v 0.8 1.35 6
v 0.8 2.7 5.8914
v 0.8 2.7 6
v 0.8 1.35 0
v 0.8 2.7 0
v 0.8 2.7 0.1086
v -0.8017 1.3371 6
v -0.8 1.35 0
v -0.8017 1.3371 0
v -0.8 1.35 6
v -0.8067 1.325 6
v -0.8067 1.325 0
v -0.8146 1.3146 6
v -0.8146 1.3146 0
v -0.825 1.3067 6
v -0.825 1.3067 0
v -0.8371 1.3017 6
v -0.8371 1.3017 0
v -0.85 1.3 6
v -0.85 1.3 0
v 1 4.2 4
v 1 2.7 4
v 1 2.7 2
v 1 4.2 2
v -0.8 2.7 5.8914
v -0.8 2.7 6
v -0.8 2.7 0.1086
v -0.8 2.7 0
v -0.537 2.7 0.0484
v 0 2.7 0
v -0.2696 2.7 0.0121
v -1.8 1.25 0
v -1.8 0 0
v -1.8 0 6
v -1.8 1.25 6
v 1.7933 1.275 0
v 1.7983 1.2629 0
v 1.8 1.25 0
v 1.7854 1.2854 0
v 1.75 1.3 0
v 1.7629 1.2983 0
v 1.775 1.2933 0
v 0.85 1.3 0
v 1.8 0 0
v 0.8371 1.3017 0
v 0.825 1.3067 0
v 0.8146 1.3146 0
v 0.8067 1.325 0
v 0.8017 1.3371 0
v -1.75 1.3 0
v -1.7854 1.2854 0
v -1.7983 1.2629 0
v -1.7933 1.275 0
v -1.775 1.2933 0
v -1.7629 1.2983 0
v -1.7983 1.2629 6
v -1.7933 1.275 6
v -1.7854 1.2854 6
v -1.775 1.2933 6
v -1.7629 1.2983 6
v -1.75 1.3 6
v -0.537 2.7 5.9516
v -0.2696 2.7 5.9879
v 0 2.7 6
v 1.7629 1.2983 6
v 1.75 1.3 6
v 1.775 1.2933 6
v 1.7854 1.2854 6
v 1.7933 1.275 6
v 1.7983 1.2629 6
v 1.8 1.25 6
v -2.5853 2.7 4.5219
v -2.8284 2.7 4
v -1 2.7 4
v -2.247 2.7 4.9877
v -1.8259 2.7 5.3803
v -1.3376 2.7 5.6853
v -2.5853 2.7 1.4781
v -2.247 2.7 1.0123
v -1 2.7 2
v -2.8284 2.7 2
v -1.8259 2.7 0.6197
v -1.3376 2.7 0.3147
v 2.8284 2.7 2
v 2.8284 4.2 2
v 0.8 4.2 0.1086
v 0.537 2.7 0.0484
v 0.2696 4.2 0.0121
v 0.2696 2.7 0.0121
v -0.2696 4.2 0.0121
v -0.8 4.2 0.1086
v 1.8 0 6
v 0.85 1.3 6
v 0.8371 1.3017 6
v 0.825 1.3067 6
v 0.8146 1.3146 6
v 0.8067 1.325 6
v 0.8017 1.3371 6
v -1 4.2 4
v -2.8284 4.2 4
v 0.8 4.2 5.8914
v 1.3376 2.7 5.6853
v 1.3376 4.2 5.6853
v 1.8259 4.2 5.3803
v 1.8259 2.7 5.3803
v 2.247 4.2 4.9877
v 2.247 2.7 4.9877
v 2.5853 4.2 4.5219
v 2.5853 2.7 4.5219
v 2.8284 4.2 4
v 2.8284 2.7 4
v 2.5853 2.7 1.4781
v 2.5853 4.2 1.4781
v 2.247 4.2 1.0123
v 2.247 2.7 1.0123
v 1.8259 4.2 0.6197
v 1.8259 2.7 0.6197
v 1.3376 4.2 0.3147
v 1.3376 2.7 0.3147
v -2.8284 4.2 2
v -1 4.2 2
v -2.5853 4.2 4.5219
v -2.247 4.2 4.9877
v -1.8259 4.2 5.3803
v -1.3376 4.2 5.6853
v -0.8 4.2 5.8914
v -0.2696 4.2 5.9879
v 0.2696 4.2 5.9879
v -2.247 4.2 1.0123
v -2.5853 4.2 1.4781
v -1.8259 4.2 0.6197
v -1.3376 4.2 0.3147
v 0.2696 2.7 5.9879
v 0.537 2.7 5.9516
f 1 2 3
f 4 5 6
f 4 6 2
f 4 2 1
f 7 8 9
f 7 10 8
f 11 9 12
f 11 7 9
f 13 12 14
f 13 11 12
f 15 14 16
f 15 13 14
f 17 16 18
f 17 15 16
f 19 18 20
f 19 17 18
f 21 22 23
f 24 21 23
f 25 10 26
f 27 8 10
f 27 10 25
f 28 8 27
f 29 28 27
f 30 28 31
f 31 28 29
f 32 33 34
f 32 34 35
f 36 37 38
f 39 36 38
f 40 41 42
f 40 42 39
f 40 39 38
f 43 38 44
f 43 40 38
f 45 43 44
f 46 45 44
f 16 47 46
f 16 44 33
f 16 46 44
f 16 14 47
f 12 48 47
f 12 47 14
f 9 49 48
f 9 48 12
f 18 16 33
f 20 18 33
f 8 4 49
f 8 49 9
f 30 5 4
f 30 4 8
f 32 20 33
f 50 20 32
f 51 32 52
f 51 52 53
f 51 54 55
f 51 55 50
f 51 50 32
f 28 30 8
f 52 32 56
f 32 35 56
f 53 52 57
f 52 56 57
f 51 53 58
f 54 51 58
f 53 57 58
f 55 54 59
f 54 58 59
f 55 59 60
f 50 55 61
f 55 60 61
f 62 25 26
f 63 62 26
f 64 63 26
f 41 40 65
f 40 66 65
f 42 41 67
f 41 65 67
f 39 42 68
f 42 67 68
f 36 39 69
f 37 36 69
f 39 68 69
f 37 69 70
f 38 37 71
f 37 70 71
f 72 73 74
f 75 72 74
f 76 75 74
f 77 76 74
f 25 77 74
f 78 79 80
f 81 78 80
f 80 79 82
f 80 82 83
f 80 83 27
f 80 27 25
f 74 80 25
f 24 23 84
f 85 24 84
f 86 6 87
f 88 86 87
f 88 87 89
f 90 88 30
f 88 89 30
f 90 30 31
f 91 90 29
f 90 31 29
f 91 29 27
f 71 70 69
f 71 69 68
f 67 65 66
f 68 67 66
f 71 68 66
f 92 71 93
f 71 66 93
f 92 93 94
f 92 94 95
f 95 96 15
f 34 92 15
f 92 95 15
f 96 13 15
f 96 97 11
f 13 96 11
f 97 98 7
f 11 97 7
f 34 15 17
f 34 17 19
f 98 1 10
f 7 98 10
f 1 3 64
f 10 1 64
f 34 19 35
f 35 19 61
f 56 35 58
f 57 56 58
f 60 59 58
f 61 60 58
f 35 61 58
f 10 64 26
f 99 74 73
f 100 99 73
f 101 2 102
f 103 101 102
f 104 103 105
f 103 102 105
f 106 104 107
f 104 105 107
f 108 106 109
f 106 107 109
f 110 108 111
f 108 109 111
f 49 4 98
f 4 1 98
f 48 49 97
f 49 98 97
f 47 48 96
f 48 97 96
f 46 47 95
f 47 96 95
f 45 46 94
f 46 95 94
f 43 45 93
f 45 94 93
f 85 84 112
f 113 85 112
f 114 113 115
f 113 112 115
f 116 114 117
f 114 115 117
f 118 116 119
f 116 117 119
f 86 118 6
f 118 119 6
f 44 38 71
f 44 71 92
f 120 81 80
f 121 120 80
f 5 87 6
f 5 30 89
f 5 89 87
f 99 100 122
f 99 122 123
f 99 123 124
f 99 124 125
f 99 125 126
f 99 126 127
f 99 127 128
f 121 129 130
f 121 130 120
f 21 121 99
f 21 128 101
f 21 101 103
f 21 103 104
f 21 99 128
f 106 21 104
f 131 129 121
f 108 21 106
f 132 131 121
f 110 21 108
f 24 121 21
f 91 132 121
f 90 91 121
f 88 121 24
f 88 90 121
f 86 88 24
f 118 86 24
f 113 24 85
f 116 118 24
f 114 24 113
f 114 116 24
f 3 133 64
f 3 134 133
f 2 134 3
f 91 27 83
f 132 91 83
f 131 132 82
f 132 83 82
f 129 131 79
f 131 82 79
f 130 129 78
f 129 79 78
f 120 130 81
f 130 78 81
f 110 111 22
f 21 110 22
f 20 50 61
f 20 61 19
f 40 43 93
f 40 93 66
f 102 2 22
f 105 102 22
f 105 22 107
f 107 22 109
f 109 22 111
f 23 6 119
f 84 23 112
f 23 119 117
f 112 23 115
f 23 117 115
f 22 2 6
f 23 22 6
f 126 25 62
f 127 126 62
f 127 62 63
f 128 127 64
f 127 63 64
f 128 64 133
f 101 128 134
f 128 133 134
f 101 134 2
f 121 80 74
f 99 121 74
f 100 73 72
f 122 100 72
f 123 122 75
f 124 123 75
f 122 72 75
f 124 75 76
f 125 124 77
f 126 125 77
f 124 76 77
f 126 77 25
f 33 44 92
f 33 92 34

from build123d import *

# Parameters (mm, degrees)
BOSS_EXTRUDE1_DEPTH = 6
BOSS_EXTRUDE2_DEPTH = 1.5
FILLET6_R           = 0.05


with BuildPart() as part:
    # Sketch2 → Boss-Extrude1 (new body)
    with BuildSketch(Plane.XY):
        Polygon((-0.8, 2.7), (0.8, 2.7), (0.8, 1.3), (1.8, 1.3), (1.8, 0), (-1.8, 0), (-1.8, 1.3), (-0.8, 1.3), align=None)
    extrude(amount=BOSS_EXTRUDE1_DEPTH)

    # Sketch3 → Boss-Extrude2 (add)
    with BuildSketch(Plane(origin=(0, 2.7, 0), x_dir=(1, 0, 0), z_dir=(0, 1, 0))):
        with BuildLine():
            ThreePointArc((0.8, -0.108633541), (0, 0), (-0.8, -0.108633541))
            Line((-0.8, -0.108633541), (-0.8, -5.891366459))
            ThreePointArc((-0.8, -5.891366459), (0, -6), (0.8, -5.891366459))
            Line((0.8, -5.891366459), (0.8, -0.108633541))
        make_face()
        with BuildLine():
            Line((-2.828427125, -2), (-1, -2))
            Line((-1, -2), (-1, -4))
            Line((-1, -4), (-2.828427125, -4))
            ThreePointArc((-2.828427125, -4), (-2.04589531, -5.194154138), (-0.8, -5.891366459))
            Line((-0.8, -5.891366459), (-0.8, -0.108633541))
            ThreePointArc((-0.8, -0.108633541), (-2.04589531, -0.805845862), (-2.828427125, -2))
        make_face()
        with BuildLine():
            ThreePointArc((2.828427125, -2), (2.04589531, -0.805845862), (0.8, -0.108633541))
            Line((0.8, -0.108633541), (0.8, -5.891366459))
            ThreePointArc((0.8, -5.891366459), (2.04589531, -5.194154138), (2.828427125, -4))
            Line((2.828427125, -4), (1, -4))
            Line((1, -4), (1, -2))
            Line((1, -2), (2.828427125, -2))
        make_face()
    extrude(amount=BOSS_EXTRUDE2_DEPTH)

    # Fillet6
    fillet6_edges = [part.edges().sort_by_distance(p)[0] for p in [
        (0.8, 1.3, 3),
        (1.8, 1.3, 3),
        (-1.8, 1.3, 3),
        (-0.8, 1.3, 3),
    ]]
    fillet(fillet6_edges, radius=FILLET6_R)


solid = part.part
